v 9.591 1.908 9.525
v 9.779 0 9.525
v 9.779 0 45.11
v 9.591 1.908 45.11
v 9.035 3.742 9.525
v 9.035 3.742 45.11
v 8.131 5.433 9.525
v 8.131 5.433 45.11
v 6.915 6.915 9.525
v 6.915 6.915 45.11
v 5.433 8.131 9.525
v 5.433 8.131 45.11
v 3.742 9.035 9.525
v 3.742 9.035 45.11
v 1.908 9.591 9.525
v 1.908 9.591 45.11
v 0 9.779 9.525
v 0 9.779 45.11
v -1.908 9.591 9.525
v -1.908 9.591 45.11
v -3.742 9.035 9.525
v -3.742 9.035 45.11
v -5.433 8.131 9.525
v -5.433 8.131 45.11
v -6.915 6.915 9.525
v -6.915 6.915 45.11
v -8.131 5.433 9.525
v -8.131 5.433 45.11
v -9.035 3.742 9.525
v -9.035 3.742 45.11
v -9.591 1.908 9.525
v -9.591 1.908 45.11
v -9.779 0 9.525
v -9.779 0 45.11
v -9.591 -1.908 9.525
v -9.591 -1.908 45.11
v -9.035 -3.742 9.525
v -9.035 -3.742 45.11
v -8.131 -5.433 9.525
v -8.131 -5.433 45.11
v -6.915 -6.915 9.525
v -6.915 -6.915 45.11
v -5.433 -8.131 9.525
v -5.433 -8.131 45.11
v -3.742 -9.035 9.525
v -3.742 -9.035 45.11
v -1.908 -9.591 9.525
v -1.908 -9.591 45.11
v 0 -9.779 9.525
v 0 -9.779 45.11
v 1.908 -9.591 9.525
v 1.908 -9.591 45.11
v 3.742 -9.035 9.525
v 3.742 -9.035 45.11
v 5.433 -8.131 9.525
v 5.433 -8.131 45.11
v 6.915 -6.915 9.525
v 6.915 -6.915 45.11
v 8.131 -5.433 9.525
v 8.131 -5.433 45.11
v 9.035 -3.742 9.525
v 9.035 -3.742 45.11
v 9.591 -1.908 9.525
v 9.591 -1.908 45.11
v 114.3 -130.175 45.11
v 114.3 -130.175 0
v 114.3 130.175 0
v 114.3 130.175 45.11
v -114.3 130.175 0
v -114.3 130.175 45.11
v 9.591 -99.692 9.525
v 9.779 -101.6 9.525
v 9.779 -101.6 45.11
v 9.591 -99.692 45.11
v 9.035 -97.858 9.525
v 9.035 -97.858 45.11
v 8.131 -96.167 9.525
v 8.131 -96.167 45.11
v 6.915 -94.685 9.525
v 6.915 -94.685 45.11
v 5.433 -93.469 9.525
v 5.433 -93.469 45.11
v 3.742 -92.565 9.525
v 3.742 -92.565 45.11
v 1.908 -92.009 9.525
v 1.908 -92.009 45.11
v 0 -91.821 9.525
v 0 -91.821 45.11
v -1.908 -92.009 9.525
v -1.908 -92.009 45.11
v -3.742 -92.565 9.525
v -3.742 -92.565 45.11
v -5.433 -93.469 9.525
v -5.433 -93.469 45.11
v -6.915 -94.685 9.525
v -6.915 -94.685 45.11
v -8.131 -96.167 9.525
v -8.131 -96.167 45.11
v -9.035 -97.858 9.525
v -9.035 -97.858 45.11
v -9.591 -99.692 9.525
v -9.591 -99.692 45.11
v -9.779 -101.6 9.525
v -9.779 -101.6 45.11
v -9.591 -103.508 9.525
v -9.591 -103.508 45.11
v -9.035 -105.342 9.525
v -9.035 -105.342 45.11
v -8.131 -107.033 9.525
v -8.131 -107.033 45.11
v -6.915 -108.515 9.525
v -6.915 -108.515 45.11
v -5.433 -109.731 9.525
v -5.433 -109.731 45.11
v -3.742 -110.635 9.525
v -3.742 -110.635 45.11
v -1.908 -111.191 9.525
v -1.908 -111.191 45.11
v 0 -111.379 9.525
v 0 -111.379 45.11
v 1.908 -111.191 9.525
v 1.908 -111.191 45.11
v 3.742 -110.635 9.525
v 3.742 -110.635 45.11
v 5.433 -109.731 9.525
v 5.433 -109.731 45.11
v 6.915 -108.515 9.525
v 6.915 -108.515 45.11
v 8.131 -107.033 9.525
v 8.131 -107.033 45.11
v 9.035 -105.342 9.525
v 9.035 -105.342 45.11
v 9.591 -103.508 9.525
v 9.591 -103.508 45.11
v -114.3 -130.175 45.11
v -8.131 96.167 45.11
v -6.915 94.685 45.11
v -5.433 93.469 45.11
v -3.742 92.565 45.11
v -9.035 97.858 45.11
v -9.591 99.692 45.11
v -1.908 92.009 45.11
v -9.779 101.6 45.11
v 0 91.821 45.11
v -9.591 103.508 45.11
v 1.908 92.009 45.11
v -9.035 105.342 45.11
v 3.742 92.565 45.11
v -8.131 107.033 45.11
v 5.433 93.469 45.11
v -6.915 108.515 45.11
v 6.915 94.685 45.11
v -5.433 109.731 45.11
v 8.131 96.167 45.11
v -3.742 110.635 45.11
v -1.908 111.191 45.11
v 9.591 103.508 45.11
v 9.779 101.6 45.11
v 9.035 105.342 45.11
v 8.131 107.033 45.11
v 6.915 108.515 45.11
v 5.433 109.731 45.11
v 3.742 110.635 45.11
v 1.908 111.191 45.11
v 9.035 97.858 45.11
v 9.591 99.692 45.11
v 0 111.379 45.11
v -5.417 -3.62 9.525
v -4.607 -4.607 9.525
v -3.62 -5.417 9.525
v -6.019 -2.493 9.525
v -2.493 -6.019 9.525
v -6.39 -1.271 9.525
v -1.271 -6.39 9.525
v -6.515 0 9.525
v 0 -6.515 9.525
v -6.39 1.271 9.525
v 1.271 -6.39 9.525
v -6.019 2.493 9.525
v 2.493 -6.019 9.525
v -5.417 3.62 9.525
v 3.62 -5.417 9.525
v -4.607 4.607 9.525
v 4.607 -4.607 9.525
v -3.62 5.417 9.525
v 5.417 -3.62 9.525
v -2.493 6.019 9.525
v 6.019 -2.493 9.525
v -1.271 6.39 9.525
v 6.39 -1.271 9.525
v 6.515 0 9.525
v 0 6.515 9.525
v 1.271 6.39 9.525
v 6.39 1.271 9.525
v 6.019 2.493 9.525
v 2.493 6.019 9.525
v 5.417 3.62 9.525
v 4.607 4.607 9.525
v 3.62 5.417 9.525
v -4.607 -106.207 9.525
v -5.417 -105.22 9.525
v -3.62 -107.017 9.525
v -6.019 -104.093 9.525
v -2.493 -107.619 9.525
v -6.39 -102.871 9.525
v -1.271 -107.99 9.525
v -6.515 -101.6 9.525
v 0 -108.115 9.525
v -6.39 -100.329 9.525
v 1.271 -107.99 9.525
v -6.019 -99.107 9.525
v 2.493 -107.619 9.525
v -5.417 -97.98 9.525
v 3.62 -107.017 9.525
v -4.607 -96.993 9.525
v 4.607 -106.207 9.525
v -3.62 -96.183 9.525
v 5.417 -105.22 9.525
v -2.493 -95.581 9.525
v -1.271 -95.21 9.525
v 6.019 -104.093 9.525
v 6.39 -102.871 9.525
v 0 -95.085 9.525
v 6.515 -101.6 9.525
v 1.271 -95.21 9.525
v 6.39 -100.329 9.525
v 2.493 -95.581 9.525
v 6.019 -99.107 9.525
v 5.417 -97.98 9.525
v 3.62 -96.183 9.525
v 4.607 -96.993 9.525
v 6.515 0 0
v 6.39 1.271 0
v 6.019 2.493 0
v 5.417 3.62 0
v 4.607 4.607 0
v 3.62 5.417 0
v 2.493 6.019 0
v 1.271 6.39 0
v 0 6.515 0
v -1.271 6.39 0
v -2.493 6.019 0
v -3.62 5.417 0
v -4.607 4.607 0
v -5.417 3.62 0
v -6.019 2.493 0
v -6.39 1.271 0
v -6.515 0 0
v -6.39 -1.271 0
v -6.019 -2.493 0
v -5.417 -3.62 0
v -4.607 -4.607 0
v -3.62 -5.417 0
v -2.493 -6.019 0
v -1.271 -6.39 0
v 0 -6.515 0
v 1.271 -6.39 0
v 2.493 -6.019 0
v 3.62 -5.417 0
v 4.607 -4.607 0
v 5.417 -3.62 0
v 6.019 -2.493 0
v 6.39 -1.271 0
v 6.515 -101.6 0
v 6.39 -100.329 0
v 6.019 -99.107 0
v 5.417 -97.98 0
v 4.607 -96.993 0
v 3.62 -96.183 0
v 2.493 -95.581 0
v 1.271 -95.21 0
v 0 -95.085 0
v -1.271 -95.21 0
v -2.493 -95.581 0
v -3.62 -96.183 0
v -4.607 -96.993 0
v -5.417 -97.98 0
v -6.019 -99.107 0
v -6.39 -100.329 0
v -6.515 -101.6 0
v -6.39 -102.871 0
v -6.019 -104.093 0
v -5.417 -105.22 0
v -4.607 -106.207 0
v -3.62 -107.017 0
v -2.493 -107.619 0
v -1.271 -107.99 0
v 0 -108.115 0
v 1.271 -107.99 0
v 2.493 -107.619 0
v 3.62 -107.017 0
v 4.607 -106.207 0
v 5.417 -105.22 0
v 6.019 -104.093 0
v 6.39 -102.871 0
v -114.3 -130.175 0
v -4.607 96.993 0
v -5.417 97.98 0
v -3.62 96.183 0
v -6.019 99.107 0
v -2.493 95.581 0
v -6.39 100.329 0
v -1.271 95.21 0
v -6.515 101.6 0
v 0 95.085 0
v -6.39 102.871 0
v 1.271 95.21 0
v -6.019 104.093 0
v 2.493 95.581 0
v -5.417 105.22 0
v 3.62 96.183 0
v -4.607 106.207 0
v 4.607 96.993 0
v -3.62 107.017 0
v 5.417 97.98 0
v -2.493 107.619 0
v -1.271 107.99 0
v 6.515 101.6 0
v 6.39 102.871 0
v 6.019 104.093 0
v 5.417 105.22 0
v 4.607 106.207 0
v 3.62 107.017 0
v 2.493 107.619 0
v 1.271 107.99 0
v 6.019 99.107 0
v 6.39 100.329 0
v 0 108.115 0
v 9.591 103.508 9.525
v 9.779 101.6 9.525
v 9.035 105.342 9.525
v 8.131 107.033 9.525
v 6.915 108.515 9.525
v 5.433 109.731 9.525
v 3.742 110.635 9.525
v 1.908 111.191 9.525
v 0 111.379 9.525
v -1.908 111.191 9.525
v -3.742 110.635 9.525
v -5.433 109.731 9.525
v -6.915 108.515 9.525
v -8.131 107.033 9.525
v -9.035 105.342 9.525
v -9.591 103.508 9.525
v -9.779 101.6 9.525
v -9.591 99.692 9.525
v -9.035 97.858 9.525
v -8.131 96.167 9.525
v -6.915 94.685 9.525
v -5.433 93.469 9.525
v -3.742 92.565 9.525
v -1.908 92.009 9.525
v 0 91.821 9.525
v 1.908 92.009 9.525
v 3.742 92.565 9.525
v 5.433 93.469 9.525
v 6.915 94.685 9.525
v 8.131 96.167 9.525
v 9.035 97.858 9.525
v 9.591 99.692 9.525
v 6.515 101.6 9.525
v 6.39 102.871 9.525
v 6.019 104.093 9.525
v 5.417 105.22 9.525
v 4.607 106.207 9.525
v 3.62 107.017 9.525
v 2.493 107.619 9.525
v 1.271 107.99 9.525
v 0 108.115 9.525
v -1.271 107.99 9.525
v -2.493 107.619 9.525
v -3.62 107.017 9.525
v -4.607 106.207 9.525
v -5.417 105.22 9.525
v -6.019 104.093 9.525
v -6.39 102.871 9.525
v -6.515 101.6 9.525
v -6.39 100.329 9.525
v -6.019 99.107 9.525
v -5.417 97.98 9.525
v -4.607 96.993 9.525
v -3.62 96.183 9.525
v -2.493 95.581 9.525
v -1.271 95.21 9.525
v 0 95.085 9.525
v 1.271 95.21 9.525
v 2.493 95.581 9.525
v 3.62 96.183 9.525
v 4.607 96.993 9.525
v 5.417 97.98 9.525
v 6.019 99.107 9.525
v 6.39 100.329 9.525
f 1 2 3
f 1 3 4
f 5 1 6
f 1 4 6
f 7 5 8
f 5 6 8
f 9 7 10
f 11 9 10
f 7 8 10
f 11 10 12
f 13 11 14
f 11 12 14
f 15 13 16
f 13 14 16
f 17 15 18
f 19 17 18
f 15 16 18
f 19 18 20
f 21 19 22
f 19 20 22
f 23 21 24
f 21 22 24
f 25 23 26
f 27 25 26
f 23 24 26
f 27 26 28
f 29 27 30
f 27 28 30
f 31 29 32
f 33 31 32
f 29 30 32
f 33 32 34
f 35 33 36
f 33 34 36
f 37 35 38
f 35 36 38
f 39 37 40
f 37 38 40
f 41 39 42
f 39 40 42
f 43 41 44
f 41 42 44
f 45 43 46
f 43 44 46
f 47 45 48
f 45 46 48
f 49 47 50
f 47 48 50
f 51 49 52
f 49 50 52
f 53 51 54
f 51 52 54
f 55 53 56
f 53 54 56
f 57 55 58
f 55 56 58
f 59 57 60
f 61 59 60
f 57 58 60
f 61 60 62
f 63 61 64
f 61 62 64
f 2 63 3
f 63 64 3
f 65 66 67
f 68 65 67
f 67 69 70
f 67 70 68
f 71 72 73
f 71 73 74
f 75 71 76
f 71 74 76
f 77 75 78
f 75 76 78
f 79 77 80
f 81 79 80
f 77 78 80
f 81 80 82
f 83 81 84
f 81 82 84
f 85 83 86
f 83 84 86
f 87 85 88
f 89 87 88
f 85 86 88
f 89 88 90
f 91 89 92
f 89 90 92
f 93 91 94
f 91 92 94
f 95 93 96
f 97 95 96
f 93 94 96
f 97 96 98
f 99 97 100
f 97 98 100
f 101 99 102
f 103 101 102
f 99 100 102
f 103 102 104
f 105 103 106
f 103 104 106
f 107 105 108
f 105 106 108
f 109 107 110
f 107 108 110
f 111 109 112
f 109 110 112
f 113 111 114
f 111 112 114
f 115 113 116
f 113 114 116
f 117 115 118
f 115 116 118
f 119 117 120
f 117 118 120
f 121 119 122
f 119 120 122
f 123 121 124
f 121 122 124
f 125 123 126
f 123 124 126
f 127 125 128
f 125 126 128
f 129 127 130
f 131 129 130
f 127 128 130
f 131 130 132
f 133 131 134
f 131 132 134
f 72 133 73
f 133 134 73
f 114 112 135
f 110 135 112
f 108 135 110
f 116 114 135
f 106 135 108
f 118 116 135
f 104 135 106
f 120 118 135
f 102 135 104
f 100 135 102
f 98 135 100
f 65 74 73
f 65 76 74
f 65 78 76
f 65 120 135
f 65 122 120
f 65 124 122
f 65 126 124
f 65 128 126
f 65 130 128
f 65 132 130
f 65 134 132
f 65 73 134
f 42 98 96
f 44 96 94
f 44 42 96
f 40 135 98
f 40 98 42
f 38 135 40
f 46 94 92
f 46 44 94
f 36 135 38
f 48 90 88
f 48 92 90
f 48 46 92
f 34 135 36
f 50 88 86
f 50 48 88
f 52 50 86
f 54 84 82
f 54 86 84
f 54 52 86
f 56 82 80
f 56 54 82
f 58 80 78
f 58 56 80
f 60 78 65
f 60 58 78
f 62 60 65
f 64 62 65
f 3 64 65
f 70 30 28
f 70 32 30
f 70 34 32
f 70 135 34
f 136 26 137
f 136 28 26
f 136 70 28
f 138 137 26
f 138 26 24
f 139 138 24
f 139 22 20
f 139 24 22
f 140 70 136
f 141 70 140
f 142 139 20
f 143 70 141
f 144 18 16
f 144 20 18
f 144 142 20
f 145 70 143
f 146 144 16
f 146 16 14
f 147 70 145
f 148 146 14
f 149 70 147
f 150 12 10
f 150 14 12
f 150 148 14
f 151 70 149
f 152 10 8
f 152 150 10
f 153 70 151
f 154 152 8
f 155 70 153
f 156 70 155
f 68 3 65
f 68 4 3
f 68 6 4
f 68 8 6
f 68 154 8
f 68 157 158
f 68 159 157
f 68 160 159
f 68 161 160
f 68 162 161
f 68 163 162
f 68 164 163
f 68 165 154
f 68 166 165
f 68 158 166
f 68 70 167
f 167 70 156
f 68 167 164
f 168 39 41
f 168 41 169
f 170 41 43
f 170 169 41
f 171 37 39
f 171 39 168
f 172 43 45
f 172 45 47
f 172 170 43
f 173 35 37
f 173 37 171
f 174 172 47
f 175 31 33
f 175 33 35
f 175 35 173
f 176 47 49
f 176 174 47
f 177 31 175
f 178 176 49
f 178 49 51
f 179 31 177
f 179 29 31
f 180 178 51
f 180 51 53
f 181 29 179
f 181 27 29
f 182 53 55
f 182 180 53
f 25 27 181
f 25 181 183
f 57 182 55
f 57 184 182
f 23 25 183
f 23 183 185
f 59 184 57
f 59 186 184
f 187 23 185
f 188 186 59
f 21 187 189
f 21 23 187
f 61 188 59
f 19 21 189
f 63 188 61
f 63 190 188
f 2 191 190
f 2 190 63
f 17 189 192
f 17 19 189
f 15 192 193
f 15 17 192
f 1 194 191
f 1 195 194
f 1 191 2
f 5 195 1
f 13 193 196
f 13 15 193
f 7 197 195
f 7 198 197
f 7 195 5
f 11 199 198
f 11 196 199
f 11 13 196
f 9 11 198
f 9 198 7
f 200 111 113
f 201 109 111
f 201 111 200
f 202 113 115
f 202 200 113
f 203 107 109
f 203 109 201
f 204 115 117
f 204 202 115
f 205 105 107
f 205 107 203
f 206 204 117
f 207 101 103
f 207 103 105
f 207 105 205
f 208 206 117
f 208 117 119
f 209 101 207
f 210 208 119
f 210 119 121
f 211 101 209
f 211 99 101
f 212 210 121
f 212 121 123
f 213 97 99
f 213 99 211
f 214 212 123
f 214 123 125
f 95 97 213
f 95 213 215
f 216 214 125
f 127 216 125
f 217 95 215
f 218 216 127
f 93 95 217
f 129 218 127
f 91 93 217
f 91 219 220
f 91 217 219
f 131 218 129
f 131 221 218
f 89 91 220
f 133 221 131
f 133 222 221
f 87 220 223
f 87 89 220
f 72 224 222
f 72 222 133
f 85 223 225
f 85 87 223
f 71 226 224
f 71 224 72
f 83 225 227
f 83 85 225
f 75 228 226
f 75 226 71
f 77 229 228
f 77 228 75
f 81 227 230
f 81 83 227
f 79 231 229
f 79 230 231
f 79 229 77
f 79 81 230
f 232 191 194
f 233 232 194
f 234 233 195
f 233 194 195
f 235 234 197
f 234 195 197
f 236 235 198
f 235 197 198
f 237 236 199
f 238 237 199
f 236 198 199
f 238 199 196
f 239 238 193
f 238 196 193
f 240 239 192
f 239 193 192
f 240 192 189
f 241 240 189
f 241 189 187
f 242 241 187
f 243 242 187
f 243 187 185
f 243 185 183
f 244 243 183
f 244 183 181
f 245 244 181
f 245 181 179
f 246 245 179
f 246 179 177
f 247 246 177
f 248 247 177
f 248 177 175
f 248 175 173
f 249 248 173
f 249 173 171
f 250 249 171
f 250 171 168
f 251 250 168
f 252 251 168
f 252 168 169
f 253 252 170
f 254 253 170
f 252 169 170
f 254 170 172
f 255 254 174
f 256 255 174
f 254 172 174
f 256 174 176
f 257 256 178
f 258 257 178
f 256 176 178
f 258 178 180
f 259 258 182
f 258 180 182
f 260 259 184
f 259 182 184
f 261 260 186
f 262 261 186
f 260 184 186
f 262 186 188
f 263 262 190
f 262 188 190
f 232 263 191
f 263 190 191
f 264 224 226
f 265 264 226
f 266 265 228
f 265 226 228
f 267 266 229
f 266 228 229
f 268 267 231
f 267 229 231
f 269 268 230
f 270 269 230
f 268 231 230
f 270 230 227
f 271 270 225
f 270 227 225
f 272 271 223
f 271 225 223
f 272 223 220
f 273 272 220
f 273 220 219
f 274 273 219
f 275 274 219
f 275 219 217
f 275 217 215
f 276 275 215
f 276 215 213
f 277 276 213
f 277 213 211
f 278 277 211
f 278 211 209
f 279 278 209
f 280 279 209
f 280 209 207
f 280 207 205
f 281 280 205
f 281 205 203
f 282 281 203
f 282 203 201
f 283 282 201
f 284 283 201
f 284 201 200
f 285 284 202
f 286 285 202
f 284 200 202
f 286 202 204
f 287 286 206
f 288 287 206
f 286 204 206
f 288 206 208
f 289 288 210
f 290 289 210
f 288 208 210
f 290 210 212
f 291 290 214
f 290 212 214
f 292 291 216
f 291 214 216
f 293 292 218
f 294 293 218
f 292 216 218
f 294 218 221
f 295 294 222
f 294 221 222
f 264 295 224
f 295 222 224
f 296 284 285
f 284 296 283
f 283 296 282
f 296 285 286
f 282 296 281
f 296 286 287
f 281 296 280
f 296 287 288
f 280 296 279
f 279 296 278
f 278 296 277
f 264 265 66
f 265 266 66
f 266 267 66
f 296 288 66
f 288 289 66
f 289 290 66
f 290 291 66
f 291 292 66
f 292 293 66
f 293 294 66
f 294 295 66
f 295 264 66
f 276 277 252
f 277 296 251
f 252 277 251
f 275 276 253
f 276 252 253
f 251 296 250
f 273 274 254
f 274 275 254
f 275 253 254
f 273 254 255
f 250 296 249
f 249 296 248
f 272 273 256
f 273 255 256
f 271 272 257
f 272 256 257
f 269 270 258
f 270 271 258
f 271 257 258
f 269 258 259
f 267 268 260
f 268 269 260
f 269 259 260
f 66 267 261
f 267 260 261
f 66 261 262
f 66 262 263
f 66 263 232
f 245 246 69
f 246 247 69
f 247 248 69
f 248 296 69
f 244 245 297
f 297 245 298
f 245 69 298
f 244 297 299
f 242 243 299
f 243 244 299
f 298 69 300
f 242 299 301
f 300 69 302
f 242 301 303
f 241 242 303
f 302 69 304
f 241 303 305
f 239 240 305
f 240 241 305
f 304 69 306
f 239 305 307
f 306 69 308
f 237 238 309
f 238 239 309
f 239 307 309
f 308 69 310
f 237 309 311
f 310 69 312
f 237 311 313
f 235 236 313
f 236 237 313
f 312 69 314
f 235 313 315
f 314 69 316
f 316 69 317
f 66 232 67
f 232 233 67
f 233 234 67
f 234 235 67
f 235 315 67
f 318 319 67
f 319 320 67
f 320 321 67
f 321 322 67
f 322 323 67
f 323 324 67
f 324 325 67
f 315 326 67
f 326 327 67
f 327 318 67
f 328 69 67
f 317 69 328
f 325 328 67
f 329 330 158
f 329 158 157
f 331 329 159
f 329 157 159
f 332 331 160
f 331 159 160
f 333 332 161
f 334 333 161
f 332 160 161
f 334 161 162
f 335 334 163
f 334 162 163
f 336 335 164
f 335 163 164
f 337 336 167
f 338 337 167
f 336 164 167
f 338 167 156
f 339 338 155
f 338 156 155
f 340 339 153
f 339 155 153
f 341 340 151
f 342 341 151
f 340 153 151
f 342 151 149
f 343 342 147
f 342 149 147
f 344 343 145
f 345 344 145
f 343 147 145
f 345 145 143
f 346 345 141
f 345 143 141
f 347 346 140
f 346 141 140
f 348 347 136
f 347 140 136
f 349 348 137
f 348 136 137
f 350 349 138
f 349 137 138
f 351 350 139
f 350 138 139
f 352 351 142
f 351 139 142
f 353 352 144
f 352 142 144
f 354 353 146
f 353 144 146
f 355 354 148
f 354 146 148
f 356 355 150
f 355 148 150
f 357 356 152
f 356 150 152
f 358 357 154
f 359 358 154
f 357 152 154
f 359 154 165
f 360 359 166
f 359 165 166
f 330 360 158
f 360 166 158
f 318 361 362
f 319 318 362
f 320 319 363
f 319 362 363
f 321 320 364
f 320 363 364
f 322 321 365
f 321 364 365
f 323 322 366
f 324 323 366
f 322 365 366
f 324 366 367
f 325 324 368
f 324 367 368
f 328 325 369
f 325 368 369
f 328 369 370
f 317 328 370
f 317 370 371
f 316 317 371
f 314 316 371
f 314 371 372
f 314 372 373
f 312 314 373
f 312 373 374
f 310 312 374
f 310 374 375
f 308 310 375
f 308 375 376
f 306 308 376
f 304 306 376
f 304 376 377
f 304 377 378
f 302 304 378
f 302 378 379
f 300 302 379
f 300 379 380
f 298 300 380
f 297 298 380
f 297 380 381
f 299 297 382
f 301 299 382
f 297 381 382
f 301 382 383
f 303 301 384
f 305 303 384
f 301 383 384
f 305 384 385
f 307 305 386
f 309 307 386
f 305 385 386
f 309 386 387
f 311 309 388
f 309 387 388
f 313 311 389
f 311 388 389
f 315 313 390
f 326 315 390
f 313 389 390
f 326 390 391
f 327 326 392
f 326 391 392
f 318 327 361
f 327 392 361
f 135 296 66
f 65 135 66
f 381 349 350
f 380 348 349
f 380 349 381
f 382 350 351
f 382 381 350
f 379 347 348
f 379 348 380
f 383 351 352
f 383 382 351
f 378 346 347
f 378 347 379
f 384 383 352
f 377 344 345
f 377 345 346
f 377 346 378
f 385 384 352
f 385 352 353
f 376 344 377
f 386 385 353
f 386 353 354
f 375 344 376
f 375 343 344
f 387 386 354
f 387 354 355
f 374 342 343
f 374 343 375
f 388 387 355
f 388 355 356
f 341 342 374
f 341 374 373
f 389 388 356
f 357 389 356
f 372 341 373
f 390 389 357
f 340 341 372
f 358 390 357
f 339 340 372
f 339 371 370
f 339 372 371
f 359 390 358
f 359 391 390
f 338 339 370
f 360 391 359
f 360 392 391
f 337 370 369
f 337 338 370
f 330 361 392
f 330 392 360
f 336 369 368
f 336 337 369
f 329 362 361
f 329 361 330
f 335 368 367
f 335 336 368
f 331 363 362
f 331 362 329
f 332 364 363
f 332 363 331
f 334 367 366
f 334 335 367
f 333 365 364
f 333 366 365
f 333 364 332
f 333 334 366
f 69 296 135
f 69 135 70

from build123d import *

# Parameters (mm, degrees)
SKETCH1_W                = 228.6
SKETCH1_H                = 260.35
BOSS_EXTRUDE1_DEPTH      = 45.1104
SKETCH2_R                = 6.5151
HAAS_T_SLOT_HOLES_DEPTH  = 180.011085727
SKETCH3_R                = 9.779
HAAS_COUNTER_BORES_DEPTH = 35.5854


with BuildPart() as part:
    # Sketch1 → Boss-Extrude1 (new body)
    with BuildSketch(Plane.XY):
        Rectangle(SKETCH1_W, SKETCH1_H)
    extrude(amount=BOSS_EXTRUDE1_DEPTH)

    # Sketch2 → HAAS T-Slot Holes (cut, through all)
    with BuildSketch(Plane.XY.offset(45.1104)):
        Circle(SKETCH2_R)
        with Locations((0, 101.6)):
            Circle(SKETCH2_R)
        with Locations((0, -101.6)):
            Circle(SKETCH2_R)
    extrude(amount=-HAAS_T_SLOT_HOLES_DEPTH, mode=Mode.SUBTRACT)

    # Sketch3 → HAAS Counter Bores (cut)
    with BuildSketch(Plane.XY.offset(45.1104)):
        with Locations((0, 101.6)):
            Circle(SKETCH3_R)
        Circle(SKETCH3_R)
        with Locations((0, -101.6)):
            Circle(SKETCH3_R)
    extrude(amount=-HAAS_COUNTER_BORES_DEPTH, mode=Mode.SUBTRACT)


solid = part.part
